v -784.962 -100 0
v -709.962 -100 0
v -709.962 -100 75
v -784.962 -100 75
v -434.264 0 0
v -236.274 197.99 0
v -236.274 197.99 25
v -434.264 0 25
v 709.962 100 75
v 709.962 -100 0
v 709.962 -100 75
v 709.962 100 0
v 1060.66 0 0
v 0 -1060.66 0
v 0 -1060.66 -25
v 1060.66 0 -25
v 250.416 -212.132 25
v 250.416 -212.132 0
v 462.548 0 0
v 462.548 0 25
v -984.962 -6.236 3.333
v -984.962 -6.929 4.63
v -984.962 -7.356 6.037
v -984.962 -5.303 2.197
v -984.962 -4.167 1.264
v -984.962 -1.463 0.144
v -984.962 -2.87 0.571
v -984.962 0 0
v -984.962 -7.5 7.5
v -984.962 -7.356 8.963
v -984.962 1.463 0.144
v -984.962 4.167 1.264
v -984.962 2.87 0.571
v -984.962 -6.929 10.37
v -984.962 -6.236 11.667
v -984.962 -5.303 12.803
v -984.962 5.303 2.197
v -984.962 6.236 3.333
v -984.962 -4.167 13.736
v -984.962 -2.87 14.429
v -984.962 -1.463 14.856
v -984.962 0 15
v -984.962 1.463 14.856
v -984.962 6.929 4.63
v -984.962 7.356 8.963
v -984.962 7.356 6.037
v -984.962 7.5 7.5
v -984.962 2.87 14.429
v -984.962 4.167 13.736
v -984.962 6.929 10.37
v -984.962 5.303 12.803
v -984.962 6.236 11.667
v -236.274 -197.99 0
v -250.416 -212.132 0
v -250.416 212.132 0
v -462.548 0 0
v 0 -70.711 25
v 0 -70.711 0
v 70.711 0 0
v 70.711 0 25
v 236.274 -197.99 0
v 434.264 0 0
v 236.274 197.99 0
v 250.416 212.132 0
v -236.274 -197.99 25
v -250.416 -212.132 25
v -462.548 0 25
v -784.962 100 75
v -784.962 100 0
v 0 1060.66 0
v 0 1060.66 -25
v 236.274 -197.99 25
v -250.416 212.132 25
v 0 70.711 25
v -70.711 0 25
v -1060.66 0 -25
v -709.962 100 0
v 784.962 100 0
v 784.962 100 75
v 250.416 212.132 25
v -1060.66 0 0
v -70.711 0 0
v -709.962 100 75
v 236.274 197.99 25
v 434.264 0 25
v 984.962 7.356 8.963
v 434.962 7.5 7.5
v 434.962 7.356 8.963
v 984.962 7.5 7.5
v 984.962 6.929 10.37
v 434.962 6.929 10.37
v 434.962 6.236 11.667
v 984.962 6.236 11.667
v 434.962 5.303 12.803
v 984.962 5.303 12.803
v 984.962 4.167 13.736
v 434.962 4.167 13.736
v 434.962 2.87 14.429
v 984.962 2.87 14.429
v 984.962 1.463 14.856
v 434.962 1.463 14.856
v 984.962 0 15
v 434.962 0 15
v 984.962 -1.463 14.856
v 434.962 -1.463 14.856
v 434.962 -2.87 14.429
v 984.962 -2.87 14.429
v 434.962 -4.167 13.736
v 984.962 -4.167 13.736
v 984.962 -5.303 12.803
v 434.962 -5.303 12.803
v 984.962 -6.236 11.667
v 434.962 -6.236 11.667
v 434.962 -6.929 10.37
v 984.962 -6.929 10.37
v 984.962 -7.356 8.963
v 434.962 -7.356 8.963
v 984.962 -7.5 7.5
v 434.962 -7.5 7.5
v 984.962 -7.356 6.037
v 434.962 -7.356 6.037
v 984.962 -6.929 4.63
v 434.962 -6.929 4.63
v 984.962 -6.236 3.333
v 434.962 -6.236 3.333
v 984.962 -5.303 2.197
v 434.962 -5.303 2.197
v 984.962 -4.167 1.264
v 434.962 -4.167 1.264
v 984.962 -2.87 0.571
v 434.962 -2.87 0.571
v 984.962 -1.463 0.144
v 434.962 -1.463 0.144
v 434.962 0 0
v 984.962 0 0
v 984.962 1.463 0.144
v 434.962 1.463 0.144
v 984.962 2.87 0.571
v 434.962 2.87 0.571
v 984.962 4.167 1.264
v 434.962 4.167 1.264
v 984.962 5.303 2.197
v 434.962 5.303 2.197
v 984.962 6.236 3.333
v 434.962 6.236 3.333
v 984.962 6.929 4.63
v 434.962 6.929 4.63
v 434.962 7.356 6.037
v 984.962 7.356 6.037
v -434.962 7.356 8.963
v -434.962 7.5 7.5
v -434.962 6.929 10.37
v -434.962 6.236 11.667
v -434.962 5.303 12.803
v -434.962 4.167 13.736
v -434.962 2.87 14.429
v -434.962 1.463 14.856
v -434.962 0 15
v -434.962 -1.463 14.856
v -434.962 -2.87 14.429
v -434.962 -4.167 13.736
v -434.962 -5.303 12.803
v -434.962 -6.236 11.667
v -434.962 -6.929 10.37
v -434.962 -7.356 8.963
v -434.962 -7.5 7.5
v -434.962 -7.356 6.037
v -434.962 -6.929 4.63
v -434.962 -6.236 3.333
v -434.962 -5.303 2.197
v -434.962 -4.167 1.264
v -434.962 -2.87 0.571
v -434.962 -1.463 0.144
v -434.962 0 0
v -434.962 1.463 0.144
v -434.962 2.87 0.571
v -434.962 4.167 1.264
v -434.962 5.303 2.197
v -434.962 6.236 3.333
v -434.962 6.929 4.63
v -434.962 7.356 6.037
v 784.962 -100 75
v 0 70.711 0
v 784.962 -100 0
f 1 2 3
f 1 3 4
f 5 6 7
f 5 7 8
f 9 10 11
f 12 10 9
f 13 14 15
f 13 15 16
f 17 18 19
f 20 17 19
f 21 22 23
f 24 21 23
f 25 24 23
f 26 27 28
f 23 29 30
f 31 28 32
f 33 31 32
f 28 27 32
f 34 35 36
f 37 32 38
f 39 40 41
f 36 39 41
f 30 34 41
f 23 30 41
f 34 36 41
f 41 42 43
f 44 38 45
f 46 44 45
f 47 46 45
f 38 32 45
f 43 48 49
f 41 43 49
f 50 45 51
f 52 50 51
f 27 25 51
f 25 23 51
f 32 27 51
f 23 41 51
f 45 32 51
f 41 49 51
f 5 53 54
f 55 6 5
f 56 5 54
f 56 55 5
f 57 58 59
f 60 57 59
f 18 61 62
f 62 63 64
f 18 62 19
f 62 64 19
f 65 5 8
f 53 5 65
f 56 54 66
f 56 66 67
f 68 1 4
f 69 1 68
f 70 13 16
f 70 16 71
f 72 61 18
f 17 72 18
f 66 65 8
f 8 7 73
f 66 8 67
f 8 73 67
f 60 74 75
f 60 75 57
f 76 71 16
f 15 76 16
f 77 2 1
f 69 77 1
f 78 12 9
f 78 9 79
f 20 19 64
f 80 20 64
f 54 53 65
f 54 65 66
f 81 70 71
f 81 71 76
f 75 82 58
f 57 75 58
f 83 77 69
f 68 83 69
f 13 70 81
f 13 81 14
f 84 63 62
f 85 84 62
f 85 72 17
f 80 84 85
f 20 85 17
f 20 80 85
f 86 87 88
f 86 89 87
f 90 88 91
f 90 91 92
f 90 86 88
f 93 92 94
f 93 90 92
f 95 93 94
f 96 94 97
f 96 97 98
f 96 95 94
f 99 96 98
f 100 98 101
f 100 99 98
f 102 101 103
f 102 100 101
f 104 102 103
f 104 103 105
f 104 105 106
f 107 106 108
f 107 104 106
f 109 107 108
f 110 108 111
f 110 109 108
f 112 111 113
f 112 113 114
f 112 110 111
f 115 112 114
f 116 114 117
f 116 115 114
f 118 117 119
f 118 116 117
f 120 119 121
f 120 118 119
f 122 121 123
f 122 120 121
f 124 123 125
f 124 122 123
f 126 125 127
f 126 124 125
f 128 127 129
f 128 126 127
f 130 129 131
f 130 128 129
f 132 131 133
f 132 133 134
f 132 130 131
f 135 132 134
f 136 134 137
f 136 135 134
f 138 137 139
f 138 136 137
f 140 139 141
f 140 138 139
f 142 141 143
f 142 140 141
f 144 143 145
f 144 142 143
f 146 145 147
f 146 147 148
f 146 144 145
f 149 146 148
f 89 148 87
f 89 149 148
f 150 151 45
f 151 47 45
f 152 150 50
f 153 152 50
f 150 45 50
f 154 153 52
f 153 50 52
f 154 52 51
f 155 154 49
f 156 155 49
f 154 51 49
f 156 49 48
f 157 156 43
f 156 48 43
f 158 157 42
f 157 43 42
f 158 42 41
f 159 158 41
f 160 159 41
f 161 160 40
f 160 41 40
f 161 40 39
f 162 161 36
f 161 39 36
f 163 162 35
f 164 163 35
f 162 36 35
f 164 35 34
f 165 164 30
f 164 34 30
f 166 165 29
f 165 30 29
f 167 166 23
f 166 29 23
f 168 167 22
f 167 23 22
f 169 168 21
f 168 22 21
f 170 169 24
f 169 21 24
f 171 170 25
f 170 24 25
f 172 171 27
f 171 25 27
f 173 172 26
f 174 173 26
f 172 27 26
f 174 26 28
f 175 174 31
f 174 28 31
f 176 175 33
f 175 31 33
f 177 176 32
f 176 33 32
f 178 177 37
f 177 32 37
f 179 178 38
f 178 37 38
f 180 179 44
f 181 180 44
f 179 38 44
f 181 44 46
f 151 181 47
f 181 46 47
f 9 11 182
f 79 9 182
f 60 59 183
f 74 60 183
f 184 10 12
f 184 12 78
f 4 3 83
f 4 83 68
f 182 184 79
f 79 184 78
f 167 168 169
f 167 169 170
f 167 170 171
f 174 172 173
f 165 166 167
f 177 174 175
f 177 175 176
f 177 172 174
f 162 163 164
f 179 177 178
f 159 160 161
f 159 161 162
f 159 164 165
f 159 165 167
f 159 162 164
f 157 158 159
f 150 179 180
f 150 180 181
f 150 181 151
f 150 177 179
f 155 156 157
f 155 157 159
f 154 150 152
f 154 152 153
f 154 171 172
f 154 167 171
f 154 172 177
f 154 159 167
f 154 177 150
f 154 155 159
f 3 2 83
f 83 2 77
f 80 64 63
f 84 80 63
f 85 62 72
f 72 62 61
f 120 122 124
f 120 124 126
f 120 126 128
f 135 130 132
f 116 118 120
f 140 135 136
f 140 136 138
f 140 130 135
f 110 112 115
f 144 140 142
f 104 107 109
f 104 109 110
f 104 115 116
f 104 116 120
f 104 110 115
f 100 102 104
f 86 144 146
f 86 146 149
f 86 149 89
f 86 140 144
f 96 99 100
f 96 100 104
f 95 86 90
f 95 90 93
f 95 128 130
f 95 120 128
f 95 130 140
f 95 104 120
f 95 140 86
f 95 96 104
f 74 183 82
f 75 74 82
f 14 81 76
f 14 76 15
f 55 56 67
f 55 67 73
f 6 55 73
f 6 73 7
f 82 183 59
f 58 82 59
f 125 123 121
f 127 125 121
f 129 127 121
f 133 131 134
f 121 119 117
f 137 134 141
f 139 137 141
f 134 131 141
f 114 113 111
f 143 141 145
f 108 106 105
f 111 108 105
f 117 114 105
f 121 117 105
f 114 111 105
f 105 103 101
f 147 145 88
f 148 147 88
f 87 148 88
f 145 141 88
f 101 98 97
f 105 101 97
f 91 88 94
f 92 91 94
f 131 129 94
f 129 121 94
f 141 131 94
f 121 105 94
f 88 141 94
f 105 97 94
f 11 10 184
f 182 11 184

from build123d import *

# Parameters (mm, degrees)
F4_DEPTH       = 25
F5_W           = 75
F5_H           = 200
F6_DEPTH       = 75
F8_DEPTH       = 25
F9_R           = 7.5
F10_DEPTH      = 200
F10_DEPTH_BACK = 350
F11_DEPTH      = 25


with BuildPart() as f4:
    # F2 (on Top) → F4 (new body)
    with BuildSketch(Plane.XY):
        Polygon((0, 1060.660172), (-1060.660172, 0), (0, -1060.660172), (1060.660172, 0), align=None)
    extrude(amount=-F4_DEPTH)


with BuildPart() as f6:
    # F5 (on face) → F6 (new body)
    with BuildSketch(Plane.XY):
        with Locations((747.46212, 0)):
            Rectangle(F5_W, F5_H)
    extrude(amount=F6_DEPTH)


with BuildPart() as f8:
    # F7 (on face) → F8 (new body)
    with BuildSketch(Plane.XY):
        Polygon((236.27417, -197.989899), (250.416306, -212.132034), (462.54834, 0), (250.416306, 212.132034), (236.27417, 197.989899), (434.264069, 0), align=None)
    extrude(amount=F8_DEPTH)


with BuildPart() as f10:
    # F9 (on face) → F10 (new body, two sides)
    with BuildSketch(Plane.YZ.offset(784.96212)) as f10_sk:
        with Locations((0, 7.5)):
            Circle(F9_R)
    extrude(amount=F10_DEPTH)
    extrude(f10_sk.sketch, amount=-F10_DEPTH_BACK)


with BuildPart() as f11:
    # F1 (on Top) → F11 (new body)
    with BuildSketch(Plane.XY):
        Polygon((0, 70.710678), (-70.710678, 0), (0, -70.710678), (70.710678, 0), align=None)
    extrude(amount=F11_DEPTH)


with BuildPart() as f12_1:
    # F12: instance of F8
    add(f8.part.mirror(Plane.YZ))


with BuildPart() as f12_2:
    # F12: instance of F10
    add(f10.part.mirror(Plane.YZ))


with BuildPart() as f12_3:
    # F12: instance of F6
    add(f6.part.mirror(Plane.YZ))


solid = Compound([f4.part, f6.part, f8.part, f10.part, f11.part, f12_1.part, f12_2.part, f12_3.part])
